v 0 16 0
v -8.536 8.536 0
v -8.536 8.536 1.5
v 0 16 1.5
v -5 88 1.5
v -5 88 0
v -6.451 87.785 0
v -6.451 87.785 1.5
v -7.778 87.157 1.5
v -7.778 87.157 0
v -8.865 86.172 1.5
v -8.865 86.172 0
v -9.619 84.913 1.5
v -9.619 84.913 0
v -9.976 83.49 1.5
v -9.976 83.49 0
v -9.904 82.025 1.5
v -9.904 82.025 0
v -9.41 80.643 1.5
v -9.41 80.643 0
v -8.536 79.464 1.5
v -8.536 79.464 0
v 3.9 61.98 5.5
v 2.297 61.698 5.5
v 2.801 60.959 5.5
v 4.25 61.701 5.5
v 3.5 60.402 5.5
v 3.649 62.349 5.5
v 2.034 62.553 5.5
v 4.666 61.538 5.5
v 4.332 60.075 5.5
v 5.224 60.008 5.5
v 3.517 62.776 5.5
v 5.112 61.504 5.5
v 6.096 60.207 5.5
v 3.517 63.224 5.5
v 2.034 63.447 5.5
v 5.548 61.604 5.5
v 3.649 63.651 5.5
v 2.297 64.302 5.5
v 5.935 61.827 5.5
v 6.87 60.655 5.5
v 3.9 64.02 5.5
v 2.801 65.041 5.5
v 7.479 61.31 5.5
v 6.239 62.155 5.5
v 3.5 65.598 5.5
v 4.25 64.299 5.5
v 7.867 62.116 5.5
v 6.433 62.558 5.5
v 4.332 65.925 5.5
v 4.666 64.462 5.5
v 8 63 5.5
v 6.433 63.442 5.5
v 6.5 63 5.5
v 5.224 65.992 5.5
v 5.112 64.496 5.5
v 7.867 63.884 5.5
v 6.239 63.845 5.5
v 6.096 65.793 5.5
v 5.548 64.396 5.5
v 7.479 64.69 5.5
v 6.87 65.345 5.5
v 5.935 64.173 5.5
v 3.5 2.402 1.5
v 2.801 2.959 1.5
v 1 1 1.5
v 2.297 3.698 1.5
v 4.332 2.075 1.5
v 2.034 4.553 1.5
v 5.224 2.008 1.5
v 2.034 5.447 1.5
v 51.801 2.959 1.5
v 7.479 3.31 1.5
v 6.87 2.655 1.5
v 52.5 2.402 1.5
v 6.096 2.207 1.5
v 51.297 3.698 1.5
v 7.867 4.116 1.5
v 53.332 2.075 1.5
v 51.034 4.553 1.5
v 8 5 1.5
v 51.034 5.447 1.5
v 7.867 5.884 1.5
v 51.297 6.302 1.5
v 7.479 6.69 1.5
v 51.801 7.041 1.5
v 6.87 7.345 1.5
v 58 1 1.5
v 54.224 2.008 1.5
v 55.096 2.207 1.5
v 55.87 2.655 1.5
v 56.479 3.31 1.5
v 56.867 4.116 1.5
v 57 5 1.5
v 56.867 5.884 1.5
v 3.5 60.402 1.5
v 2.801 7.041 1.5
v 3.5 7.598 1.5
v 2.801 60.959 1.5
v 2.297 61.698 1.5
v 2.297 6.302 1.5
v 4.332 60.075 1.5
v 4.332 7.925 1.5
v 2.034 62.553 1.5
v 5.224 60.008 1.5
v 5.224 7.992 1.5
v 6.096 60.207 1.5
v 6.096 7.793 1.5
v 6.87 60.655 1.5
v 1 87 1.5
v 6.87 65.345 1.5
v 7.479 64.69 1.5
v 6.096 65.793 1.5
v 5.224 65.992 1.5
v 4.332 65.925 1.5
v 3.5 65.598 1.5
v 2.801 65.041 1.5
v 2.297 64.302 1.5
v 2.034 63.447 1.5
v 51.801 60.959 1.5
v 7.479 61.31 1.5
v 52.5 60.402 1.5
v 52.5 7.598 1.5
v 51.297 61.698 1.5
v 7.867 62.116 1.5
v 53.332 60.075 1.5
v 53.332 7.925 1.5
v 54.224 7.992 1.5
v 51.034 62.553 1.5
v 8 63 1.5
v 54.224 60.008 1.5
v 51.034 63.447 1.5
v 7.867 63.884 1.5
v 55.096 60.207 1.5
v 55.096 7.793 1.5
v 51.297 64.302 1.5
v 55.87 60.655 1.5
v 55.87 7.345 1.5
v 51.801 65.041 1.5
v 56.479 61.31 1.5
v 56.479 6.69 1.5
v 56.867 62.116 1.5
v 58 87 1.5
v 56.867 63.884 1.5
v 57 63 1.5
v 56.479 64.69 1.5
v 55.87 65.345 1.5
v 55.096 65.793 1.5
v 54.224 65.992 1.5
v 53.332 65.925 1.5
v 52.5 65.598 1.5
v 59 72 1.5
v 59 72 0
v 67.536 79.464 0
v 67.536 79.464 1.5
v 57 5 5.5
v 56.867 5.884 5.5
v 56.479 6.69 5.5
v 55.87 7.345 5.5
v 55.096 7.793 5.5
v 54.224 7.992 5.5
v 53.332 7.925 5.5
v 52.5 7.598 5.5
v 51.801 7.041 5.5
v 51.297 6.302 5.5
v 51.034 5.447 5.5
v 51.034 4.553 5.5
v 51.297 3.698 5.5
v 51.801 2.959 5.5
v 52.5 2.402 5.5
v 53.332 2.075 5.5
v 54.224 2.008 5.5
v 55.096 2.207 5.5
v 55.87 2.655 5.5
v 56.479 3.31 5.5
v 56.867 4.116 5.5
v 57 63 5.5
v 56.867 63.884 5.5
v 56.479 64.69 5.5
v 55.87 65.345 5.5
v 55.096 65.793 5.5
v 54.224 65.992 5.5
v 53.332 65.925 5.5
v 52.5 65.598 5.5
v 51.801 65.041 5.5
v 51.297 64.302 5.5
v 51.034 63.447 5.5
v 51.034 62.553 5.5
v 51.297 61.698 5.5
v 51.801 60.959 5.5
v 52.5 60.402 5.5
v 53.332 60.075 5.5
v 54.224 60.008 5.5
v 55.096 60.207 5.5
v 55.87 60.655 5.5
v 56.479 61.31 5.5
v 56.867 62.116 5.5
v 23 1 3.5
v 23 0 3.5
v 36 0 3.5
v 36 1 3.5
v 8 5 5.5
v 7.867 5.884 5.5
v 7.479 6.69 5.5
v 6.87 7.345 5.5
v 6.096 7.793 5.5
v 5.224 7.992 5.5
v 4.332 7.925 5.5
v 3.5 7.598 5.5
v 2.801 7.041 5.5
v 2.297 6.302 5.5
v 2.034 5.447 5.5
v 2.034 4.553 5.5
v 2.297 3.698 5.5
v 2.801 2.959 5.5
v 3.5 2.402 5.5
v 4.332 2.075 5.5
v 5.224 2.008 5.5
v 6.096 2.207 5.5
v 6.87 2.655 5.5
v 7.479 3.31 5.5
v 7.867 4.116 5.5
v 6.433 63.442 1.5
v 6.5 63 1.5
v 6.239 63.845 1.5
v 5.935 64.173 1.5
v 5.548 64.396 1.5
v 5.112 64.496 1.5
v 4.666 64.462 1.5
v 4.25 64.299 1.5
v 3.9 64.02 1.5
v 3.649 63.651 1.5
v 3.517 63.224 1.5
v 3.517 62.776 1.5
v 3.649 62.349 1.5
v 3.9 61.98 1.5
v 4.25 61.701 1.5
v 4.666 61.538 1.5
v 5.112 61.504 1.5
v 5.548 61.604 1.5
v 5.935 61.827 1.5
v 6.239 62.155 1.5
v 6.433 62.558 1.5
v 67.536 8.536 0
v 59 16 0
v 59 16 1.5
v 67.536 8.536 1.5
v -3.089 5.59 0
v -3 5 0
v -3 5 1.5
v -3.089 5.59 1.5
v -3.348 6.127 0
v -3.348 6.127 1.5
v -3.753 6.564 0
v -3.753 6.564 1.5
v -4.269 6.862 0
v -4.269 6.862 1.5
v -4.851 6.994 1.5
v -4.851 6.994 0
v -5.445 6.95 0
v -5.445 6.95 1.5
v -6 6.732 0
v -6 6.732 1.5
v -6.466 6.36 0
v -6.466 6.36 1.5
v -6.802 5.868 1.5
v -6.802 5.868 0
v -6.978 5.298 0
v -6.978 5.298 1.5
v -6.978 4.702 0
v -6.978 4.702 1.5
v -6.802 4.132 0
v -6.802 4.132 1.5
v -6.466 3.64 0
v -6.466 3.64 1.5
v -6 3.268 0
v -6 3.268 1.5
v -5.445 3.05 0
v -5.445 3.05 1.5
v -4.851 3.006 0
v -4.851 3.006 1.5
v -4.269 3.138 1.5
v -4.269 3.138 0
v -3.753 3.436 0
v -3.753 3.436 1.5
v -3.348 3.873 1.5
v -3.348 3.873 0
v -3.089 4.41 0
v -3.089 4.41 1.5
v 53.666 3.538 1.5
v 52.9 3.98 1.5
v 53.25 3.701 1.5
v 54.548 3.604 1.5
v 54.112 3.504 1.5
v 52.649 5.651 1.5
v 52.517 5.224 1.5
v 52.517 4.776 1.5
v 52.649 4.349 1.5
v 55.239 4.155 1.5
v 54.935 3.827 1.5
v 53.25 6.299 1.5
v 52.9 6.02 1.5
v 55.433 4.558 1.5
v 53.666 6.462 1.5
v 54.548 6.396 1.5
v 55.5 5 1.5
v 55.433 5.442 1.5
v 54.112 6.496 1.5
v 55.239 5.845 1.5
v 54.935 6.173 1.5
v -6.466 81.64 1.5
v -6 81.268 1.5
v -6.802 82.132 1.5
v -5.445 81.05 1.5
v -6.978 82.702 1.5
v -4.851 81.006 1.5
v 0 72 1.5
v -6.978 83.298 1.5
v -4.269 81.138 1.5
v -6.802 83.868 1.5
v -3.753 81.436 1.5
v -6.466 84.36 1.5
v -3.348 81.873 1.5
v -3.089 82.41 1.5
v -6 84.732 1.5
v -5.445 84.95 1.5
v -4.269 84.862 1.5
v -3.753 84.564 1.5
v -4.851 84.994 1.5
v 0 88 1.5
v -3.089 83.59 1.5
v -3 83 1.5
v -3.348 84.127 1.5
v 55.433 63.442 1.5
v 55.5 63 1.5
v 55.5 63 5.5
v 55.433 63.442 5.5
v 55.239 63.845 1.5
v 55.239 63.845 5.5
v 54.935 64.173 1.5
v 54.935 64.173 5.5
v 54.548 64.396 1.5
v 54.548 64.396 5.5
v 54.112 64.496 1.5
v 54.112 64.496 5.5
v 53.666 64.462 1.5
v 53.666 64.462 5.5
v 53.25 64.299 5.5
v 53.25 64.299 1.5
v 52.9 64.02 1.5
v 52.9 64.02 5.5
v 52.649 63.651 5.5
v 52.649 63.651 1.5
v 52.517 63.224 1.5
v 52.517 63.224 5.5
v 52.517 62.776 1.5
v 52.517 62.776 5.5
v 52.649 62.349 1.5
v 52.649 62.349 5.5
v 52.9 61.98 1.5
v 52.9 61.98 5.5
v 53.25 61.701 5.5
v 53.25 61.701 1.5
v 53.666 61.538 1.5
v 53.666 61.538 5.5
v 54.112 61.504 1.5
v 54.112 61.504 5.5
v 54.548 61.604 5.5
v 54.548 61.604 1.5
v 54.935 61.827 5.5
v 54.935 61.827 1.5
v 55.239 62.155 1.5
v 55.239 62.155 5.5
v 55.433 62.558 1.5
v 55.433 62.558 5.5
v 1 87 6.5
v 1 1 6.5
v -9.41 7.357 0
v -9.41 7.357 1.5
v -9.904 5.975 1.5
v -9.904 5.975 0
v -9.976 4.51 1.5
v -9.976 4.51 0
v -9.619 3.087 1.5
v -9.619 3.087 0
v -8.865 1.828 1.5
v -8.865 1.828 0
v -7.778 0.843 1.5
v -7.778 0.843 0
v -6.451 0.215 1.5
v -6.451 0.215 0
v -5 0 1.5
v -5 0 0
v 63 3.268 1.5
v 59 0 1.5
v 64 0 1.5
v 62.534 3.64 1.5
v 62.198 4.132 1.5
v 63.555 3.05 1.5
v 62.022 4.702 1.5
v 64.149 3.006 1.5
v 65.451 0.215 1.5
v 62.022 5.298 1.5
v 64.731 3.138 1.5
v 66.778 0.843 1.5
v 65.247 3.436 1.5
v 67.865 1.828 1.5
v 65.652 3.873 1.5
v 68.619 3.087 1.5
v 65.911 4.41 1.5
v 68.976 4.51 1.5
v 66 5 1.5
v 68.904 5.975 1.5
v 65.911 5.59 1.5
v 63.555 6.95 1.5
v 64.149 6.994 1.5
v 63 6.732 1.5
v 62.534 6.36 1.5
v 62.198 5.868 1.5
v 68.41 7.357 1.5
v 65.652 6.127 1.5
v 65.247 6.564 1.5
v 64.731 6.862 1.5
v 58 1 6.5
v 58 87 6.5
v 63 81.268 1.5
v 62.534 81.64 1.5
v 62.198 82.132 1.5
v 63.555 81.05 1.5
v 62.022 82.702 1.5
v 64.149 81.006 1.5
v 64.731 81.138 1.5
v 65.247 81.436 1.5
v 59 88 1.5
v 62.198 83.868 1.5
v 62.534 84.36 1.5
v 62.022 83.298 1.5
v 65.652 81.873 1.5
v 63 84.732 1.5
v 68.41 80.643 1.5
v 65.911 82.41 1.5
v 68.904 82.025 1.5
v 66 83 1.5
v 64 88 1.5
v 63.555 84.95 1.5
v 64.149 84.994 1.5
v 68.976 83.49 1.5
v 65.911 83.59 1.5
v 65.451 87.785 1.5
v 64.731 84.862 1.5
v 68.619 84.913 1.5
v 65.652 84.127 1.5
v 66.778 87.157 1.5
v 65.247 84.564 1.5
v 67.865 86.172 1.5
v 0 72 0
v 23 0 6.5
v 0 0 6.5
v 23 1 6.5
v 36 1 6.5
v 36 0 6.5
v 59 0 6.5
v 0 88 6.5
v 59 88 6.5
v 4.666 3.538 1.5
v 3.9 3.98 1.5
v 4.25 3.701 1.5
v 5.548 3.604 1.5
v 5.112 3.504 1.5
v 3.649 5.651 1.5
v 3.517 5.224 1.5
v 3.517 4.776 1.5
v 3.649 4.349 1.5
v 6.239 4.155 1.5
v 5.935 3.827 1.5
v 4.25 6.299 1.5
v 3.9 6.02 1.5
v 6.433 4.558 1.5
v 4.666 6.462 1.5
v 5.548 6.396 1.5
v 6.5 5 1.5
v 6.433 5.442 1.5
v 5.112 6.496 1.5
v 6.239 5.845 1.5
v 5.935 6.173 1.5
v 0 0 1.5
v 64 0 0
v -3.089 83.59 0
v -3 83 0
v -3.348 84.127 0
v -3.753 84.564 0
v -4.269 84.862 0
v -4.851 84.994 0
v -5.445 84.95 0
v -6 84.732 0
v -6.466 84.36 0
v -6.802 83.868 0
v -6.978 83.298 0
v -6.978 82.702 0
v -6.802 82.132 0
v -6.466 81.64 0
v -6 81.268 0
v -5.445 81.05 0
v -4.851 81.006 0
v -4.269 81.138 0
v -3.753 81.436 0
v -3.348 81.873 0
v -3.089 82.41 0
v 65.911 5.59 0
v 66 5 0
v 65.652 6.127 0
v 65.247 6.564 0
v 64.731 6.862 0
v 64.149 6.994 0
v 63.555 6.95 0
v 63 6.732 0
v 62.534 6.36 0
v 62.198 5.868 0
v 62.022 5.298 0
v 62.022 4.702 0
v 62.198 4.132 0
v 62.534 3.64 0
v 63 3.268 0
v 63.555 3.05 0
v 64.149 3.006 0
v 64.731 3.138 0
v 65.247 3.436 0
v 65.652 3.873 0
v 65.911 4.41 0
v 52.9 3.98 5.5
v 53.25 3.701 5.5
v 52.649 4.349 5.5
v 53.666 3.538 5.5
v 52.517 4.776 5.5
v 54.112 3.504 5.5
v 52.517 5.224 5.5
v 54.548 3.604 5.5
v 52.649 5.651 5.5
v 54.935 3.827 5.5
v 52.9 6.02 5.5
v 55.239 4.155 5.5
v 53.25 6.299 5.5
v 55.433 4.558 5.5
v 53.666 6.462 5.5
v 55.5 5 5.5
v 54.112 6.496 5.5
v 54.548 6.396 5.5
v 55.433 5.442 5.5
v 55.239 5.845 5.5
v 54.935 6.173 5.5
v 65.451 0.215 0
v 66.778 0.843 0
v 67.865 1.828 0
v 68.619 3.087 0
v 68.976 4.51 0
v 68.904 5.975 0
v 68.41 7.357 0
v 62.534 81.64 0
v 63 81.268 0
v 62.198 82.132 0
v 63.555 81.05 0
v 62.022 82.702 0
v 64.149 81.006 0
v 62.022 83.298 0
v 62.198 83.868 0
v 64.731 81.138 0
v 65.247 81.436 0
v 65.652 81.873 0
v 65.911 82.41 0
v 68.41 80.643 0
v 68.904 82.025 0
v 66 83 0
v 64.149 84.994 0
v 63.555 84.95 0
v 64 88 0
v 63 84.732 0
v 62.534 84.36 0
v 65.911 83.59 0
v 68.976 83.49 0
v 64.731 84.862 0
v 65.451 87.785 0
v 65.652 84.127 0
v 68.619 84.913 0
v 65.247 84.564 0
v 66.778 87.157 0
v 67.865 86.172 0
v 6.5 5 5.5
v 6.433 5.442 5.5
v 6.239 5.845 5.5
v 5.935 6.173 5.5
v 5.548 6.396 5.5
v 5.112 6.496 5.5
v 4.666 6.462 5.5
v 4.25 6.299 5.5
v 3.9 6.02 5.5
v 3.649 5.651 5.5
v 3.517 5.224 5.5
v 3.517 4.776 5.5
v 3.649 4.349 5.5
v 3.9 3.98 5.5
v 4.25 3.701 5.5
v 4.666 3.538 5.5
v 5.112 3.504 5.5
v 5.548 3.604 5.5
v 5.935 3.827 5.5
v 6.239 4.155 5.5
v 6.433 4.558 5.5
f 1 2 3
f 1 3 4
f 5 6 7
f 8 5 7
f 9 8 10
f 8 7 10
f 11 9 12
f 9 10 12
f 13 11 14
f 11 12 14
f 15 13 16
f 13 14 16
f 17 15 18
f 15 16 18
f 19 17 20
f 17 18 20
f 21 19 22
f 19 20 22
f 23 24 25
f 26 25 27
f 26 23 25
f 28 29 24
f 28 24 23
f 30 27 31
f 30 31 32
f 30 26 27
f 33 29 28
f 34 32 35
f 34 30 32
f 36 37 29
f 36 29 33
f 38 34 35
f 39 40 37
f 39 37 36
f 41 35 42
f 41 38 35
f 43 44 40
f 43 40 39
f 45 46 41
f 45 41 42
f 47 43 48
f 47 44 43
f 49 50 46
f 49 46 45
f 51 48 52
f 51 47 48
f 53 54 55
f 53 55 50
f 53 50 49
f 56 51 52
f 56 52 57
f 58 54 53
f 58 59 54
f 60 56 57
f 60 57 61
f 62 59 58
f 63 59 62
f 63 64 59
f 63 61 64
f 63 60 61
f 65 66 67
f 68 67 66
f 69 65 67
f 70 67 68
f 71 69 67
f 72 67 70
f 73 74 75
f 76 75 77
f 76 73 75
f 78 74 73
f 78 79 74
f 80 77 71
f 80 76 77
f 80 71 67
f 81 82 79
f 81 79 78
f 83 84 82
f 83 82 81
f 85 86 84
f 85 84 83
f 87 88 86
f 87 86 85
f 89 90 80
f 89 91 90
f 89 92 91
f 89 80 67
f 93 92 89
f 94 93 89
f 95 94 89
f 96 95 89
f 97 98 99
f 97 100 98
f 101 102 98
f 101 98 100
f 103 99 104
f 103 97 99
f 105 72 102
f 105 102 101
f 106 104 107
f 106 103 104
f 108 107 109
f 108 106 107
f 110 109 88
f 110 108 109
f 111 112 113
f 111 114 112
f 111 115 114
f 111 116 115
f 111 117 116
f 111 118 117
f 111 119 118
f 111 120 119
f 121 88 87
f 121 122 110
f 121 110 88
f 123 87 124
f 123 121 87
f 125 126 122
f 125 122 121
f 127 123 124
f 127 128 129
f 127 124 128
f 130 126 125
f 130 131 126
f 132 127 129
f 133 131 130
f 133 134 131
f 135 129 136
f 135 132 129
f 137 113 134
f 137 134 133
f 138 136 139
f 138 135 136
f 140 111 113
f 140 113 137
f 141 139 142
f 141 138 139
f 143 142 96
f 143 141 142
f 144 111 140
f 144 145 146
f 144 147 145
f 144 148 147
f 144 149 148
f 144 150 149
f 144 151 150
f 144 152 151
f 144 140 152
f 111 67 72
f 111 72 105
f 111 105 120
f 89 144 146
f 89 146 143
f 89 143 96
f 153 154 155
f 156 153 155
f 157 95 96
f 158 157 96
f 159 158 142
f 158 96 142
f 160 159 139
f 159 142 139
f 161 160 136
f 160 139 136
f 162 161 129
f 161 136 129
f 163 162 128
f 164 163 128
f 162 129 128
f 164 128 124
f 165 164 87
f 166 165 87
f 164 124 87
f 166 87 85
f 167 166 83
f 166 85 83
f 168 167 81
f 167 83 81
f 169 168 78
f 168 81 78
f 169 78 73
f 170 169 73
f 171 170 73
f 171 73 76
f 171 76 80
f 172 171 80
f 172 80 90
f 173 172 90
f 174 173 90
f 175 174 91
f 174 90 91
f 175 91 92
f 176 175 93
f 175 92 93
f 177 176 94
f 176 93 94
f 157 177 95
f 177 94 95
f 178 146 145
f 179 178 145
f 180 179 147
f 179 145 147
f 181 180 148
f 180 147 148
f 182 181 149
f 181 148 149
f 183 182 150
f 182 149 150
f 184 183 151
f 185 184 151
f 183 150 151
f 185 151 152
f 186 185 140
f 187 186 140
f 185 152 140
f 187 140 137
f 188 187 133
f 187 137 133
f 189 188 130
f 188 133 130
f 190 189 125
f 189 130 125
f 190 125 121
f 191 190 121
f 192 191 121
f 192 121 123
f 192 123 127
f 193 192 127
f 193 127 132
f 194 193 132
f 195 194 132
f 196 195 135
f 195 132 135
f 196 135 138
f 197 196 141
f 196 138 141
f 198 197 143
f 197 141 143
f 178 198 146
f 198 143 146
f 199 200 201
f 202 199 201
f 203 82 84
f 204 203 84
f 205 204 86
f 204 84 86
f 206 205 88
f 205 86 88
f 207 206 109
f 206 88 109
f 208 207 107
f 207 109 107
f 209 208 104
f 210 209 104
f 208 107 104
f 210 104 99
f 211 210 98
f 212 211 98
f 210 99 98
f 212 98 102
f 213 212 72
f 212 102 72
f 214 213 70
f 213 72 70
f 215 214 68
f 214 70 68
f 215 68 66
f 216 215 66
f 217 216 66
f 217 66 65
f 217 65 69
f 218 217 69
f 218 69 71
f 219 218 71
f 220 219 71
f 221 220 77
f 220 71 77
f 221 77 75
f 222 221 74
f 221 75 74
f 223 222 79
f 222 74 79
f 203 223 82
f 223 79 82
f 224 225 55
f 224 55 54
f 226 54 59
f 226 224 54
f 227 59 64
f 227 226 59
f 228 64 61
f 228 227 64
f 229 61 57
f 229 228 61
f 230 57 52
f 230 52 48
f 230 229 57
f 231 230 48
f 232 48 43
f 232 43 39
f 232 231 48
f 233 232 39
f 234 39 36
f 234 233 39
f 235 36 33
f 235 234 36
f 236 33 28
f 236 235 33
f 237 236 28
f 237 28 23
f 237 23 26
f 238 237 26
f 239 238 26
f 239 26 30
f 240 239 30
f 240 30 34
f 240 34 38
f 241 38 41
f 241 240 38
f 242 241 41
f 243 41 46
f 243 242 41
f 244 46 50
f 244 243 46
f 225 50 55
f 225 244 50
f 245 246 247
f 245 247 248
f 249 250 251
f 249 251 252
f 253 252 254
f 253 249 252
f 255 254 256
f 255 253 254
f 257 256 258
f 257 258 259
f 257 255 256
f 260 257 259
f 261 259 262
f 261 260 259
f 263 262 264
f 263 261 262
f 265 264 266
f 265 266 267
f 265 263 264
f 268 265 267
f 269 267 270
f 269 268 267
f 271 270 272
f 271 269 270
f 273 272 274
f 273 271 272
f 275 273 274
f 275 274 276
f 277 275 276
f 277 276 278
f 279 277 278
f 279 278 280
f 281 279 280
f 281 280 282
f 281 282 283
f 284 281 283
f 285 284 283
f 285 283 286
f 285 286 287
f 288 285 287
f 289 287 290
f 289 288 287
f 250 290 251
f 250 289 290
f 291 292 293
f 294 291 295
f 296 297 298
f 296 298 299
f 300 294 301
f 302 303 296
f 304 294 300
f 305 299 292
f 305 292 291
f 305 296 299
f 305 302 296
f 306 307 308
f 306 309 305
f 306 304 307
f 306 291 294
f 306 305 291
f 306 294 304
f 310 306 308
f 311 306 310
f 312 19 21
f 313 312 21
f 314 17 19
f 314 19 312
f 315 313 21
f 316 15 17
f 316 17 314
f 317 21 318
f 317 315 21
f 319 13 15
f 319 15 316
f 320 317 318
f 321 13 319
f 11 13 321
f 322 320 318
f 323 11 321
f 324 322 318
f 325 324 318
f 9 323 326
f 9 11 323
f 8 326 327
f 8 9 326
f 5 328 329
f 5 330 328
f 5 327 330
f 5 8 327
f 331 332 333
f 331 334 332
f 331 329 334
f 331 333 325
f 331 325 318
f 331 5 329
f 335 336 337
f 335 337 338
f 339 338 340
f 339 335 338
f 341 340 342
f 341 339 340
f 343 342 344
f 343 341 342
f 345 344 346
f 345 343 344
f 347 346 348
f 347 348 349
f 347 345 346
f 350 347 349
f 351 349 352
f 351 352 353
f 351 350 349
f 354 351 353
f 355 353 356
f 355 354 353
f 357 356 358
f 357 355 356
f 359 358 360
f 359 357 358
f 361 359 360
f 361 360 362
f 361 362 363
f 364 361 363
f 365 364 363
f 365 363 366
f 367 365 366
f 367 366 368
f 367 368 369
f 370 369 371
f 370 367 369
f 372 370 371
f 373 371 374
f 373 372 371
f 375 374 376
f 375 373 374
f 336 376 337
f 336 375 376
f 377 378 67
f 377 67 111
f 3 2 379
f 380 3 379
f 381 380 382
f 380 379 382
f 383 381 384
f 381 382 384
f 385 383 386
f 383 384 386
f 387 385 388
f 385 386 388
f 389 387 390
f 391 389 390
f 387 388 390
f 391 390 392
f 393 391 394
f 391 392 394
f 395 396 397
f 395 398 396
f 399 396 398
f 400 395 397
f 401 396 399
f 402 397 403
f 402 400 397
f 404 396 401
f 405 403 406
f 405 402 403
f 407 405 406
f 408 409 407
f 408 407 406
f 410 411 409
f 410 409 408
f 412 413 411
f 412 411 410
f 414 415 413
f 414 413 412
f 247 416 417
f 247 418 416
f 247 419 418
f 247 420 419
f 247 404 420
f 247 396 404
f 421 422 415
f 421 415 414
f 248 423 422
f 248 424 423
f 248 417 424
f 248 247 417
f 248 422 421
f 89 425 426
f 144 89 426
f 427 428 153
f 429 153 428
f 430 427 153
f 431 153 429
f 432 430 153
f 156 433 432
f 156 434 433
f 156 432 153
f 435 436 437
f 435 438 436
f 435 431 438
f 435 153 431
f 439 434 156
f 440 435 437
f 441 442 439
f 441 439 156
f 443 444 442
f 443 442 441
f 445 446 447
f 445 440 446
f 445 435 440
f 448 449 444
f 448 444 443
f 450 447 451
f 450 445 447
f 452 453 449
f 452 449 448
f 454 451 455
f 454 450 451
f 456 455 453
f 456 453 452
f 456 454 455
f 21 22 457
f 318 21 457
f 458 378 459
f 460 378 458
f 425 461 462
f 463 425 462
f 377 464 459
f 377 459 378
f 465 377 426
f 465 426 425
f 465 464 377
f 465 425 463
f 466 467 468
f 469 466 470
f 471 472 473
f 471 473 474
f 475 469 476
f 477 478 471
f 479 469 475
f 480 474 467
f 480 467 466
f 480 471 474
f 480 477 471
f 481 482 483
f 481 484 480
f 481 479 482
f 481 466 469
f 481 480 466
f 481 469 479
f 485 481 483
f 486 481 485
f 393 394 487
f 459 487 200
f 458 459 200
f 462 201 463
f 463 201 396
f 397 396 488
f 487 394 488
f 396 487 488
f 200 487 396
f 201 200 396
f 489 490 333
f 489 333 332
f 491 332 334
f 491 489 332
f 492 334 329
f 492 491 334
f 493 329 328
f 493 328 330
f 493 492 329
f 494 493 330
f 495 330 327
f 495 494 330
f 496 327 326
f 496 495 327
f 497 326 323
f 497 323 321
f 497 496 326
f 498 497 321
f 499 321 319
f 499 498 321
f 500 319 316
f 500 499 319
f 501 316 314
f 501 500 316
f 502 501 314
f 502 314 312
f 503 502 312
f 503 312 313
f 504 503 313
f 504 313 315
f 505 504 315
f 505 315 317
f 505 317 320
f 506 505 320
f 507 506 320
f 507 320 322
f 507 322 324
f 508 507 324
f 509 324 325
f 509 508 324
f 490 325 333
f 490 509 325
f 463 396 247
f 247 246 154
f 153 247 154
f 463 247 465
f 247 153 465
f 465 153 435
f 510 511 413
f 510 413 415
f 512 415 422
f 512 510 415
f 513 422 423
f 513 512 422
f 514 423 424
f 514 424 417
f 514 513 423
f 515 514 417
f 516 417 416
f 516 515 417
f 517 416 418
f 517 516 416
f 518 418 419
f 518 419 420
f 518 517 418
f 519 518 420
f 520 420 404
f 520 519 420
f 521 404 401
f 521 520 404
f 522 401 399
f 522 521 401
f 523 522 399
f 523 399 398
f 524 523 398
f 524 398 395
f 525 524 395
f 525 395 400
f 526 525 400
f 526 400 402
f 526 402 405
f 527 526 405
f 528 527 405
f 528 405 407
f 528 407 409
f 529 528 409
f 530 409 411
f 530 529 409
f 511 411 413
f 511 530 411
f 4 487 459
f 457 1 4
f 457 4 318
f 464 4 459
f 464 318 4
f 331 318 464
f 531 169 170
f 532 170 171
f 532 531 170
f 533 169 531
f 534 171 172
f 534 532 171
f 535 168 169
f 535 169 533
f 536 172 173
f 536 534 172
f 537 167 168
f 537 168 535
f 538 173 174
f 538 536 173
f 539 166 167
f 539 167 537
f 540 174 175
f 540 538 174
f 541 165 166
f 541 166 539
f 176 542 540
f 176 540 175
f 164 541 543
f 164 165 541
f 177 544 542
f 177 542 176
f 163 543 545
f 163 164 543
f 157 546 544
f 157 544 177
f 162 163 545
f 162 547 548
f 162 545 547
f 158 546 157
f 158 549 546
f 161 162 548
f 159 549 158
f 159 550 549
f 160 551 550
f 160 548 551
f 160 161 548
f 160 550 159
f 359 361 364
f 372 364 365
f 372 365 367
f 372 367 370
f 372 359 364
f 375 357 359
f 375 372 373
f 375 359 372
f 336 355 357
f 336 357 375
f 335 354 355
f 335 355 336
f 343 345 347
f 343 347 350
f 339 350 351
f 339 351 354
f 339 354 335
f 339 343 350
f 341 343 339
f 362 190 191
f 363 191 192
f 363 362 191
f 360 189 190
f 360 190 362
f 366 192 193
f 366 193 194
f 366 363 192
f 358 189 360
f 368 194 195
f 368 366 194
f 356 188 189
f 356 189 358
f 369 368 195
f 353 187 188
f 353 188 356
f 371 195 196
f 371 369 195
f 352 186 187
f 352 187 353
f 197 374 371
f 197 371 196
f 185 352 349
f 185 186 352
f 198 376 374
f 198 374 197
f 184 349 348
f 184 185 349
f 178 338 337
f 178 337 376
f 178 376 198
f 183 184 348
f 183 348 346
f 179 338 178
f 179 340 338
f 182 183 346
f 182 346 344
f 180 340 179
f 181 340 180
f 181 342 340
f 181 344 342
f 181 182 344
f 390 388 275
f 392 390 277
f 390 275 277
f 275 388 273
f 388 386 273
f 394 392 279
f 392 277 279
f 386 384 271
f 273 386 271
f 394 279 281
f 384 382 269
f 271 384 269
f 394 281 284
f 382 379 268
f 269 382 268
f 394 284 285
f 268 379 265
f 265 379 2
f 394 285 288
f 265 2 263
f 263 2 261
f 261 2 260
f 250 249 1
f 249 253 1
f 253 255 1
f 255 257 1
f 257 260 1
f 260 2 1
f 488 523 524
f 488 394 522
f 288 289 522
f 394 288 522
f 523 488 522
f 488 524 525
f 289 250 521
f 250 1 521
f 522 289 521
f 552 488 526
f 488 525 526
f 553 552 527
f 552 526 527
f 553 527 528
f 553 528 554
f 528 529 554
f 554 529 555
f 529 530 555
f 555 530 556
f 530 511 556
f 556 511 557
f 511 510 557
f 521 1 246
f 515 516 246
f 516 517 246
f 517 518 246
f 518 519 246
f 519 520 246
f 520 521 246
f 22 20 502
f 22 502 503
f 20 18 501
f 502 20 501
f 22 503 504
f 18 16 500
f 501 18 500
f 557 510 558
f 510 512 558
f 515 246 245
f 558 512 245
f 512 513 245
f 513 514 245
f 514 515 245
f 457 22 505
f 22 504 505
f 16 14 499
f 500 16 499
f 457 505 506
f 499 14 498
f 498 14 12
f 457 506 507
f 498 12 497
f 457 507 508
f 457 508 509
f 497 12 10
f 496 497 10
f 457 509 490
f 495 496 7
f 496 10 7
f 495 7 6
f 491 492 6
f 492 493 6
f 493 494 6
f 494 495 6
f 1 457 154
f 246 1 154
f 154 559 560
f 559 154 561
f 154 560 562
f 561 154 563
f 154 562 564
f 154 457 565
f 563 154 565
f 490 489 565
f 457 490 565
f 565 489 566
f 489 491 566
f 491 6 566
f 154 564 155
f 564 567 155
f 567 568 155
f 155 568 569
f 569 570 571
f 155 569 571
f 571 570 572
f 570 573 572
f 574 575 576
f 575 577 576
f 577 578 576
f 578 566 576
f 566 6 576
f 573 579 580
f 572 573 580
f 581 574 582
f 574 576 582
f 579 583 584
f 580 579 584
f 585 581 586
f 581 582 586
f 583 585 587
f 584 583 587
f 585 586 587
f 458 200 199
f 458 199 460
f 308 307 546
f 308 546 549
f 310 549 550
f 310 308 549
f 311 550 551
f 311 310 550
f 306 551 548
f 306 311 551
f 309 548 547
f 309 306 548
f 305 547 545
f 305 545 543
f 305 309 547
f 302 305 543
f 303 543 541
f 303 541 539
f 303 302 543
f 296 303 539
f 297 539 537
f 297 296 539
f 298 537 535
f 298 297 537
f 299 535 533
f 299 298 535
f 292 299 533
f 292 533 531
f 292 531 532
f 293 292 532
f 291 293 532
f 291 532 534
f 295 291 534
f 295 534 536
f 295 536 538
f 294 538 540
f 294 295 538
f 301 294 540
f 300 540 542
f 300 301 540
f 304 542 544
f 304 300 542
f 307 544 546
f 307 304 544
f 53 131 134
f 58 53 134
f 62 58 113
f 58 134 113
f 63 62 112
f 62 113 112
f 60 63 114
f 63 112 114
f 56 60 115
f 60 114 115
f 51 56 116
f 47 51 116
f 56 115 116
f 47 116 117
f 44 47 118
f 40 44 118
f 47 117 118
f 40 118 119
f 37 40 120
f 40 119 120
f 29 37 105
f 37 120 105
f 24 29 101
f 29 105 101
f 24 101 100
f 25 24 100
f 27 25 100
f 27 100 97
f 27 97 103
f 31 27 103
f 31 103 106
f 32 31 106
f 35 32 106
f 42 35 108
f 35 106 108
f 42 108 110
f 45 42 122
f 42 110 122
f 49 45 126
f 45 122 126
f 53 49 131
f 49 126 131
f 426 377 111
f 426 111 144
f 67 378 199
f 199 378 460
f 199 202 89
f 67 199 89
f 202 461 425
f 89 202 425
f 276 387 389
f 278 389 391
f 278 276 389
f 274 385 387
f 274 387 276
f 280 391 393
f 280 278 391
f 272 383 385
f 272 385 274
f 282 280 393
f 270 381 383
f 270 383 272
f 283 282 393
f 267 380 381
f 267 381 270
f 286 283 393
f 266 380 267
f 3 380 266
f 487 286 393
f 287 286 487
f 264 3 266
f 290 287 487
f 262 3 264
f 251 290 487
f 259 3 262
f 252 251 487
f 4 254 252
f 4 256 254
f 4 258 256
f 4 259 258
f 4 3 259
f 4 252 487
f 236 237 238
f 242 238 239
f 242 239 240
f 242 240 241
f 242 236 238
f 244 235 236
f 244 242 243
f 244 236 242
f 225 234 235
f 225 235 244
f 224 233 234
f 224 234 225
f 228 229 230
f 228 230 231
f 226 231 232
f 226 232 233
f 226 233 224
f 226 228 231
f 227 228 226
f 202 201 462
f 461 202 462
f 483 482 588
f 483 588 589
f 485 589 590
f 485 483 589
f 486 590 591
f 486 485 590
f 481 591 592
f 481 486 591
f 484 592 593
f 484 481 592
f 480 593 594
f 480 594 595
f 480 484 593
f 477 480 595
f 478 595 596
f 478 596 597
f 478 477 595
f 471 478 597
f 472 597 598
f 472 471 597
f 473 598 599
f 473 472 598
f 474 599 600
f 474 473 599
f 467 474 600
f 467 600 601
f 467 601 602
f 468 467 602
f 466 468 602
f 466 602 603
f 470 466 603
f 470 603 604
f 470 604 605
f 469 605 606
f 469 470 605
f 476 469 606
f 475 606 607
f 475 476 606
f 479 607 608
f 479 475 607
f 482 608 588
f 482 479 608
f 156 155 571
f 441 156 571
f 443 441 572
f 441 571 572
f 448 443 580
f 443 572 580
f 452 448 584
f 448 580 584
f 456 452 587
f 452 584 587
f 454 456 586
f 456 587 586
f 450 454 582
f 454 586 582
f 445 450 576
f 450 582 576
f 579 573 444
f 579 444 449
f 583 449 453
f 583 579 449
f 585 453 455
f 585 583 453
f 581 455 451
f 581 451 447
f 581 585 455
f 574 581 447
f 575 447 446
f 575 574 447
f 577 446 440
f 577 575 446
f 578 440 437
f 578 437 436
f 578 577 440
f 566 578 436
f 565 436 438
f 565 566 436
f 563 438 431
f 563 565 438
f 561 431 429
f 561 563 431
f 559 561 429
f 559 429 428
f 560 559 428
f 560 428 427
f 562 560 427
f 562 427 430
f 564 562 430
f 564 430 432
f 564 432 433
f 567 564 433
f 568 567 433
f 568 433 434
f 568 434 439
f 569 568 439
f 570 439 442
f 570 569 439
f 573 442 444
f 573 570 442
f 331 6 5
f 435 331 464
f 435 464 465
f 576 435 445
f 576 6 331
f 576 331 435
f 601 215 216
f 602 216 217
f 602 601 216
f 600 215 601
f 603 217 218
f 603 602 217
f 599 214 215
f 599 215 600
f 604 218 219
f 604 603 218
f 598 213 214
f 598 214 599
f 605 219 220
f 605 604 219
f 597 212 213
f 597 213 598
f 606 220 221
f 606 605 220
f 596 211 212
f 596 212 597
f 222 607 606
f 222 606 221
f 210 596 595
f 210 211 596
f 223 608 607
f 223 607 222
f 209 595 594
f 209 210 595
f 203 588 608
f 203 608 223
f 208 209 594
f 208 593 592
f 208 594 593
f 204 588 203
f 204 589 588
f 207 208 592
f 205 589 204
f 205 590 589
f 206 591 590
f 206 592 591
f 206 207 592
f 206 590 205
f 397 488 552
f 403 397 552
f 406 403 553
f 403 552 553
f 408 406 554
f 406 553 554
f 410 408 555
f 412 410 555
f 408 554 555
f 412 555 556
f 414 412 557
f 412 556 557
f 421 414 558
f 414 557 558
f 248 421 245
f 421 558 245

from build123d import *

# Parameters (mm, degrees)
SKETCH_R        = 2
PAD_DEPTH       = 1.5
SKETCH001_W     = 59
SKETCH001_H     = 88
PAD001_DEPTH    = 5
SKETCH002_W     = 57
SKETCH002_H     = 86
POCKET_DEPTH    = 5
SKETCH003_W     = 13
SKETCH003_H     = 3
POCKET001_DEPTH = 1
SKETCH004_R     = 3
SKETCH004_R_2   = 1.5
PAD002_DEPTH    = 4


with BuildPart() as part:
    # Sketch → Pad (new body)
    with BuildSketch(Plane.XY):
        with BuildLine():
            Line((0, 0), (59, 0))
            Line((63.999982, 0), (59, 0))
            ThreePointArc((63.999982, 0), (68.619394, 3.086575), (67.535534, 8.535534))
            Line((59, 16), (67.535534, 8.535534))
            Line((59, 16), (59, 72))
            Line((59, 72), (67.535534, 79.464466))
            ThreePointArc((67.535534, 79.464466), (68.619394, 84.913425), (63.999983, 88))
            Line((59, 88), (63.999983, 88))
            Line((59, 88), (0, 88))
            Line((-4.999983, 88), (0, 88))
            ThreePointArc((-4.999983, 88), (-9.619394, 84.913425), (-8.535534, 79.464466))
            Line((-8.535534, 79.464466), (0, 72))
            Line((0, 72), (0, 16))
            Line((-8.535534, 8.535534), (0, 16))
            ThreePointArc((-8.535534, 8.535534), (-9.619398, 3.086583), (-5, 0))
            Line((0, 0), (-5, 0))
        make_face()
        with Locations((-5, 83)):
            Circle(SKETCH_R, mode=Mode.SUBTRACT)
        with Locations((64, 83)):
            Circle(SKETCH_R, mode=Mode.SUBTRACT)
        with Locations((-5, 5)):
            Circle(SKETCH_R, mode=Mode.SUBTRACT)
        with Locations((64, 5)):
            Circle(SKETCH_R, mode=Mode.SUBTRACT)
    extrude(amount=PAD_DEPTH)

    # Sketch001 → Pad001 (new body)
    with BuildSketch(Plane.XY.offset(1.5)):
        with Locations((29.5, 44)):
            Rectangle(SKETCH001_W, SKETCH001_H)
    extrude(amount=PAD001_DEPTH)

    # Sketch002 → Pocket (cut)
    with BuildSketch(Plane.XY.offset(6.5)):
        with Locations((29.5, 44)):
            Rectangle(SKETCH002_W, SKETCH002_H)
    extrude(amount=-POCKET_DEPTH, mode=Mode.SUBTRACT)

    # Sketch003 → Pocket001 (cut)
    with BuildSketch(Plane.XZ):
        with Locations((29.5, 5)):
            Rectangle(SKETCH003_W, SKETCH003_H)
    extrude(amount=-POCKET001_DEPTH, mode=Mode.SUBTRACT)

    # Sketch004 → Pad002 (new body)
    with BuildSketch(Plane.XY.offset(1.5)):
        with Locations((5, 63)):
            Circle(SKETCH004_R)
        with Locations((5, 63)):
            Circle(SKETCH004_R_2, mode=Mode.SUBTRACT)
        with Locations((54, 63)):
            Circle(SKETCH004_R)
        with Locations((54, 63)):
            Circle(SKETCH004_R_2, mode=Mode.SUBTRACT)
        with Locations((5, 5)):
            Circle(SKETCH004_R)
        with Locations((5, 5)):
            Circle(SKETCH004_R_2, mode=Mode.SUBTRACT)
        with Locations((54, 5)):
            Circle(SKETCH004_R)
        with Locations((54, 5)):
            Circle(SKETCH004_R_2, mode=Mode.SUBTRACT)
    extrude(amount=PAD002_DEPTH)


solid = part.part
